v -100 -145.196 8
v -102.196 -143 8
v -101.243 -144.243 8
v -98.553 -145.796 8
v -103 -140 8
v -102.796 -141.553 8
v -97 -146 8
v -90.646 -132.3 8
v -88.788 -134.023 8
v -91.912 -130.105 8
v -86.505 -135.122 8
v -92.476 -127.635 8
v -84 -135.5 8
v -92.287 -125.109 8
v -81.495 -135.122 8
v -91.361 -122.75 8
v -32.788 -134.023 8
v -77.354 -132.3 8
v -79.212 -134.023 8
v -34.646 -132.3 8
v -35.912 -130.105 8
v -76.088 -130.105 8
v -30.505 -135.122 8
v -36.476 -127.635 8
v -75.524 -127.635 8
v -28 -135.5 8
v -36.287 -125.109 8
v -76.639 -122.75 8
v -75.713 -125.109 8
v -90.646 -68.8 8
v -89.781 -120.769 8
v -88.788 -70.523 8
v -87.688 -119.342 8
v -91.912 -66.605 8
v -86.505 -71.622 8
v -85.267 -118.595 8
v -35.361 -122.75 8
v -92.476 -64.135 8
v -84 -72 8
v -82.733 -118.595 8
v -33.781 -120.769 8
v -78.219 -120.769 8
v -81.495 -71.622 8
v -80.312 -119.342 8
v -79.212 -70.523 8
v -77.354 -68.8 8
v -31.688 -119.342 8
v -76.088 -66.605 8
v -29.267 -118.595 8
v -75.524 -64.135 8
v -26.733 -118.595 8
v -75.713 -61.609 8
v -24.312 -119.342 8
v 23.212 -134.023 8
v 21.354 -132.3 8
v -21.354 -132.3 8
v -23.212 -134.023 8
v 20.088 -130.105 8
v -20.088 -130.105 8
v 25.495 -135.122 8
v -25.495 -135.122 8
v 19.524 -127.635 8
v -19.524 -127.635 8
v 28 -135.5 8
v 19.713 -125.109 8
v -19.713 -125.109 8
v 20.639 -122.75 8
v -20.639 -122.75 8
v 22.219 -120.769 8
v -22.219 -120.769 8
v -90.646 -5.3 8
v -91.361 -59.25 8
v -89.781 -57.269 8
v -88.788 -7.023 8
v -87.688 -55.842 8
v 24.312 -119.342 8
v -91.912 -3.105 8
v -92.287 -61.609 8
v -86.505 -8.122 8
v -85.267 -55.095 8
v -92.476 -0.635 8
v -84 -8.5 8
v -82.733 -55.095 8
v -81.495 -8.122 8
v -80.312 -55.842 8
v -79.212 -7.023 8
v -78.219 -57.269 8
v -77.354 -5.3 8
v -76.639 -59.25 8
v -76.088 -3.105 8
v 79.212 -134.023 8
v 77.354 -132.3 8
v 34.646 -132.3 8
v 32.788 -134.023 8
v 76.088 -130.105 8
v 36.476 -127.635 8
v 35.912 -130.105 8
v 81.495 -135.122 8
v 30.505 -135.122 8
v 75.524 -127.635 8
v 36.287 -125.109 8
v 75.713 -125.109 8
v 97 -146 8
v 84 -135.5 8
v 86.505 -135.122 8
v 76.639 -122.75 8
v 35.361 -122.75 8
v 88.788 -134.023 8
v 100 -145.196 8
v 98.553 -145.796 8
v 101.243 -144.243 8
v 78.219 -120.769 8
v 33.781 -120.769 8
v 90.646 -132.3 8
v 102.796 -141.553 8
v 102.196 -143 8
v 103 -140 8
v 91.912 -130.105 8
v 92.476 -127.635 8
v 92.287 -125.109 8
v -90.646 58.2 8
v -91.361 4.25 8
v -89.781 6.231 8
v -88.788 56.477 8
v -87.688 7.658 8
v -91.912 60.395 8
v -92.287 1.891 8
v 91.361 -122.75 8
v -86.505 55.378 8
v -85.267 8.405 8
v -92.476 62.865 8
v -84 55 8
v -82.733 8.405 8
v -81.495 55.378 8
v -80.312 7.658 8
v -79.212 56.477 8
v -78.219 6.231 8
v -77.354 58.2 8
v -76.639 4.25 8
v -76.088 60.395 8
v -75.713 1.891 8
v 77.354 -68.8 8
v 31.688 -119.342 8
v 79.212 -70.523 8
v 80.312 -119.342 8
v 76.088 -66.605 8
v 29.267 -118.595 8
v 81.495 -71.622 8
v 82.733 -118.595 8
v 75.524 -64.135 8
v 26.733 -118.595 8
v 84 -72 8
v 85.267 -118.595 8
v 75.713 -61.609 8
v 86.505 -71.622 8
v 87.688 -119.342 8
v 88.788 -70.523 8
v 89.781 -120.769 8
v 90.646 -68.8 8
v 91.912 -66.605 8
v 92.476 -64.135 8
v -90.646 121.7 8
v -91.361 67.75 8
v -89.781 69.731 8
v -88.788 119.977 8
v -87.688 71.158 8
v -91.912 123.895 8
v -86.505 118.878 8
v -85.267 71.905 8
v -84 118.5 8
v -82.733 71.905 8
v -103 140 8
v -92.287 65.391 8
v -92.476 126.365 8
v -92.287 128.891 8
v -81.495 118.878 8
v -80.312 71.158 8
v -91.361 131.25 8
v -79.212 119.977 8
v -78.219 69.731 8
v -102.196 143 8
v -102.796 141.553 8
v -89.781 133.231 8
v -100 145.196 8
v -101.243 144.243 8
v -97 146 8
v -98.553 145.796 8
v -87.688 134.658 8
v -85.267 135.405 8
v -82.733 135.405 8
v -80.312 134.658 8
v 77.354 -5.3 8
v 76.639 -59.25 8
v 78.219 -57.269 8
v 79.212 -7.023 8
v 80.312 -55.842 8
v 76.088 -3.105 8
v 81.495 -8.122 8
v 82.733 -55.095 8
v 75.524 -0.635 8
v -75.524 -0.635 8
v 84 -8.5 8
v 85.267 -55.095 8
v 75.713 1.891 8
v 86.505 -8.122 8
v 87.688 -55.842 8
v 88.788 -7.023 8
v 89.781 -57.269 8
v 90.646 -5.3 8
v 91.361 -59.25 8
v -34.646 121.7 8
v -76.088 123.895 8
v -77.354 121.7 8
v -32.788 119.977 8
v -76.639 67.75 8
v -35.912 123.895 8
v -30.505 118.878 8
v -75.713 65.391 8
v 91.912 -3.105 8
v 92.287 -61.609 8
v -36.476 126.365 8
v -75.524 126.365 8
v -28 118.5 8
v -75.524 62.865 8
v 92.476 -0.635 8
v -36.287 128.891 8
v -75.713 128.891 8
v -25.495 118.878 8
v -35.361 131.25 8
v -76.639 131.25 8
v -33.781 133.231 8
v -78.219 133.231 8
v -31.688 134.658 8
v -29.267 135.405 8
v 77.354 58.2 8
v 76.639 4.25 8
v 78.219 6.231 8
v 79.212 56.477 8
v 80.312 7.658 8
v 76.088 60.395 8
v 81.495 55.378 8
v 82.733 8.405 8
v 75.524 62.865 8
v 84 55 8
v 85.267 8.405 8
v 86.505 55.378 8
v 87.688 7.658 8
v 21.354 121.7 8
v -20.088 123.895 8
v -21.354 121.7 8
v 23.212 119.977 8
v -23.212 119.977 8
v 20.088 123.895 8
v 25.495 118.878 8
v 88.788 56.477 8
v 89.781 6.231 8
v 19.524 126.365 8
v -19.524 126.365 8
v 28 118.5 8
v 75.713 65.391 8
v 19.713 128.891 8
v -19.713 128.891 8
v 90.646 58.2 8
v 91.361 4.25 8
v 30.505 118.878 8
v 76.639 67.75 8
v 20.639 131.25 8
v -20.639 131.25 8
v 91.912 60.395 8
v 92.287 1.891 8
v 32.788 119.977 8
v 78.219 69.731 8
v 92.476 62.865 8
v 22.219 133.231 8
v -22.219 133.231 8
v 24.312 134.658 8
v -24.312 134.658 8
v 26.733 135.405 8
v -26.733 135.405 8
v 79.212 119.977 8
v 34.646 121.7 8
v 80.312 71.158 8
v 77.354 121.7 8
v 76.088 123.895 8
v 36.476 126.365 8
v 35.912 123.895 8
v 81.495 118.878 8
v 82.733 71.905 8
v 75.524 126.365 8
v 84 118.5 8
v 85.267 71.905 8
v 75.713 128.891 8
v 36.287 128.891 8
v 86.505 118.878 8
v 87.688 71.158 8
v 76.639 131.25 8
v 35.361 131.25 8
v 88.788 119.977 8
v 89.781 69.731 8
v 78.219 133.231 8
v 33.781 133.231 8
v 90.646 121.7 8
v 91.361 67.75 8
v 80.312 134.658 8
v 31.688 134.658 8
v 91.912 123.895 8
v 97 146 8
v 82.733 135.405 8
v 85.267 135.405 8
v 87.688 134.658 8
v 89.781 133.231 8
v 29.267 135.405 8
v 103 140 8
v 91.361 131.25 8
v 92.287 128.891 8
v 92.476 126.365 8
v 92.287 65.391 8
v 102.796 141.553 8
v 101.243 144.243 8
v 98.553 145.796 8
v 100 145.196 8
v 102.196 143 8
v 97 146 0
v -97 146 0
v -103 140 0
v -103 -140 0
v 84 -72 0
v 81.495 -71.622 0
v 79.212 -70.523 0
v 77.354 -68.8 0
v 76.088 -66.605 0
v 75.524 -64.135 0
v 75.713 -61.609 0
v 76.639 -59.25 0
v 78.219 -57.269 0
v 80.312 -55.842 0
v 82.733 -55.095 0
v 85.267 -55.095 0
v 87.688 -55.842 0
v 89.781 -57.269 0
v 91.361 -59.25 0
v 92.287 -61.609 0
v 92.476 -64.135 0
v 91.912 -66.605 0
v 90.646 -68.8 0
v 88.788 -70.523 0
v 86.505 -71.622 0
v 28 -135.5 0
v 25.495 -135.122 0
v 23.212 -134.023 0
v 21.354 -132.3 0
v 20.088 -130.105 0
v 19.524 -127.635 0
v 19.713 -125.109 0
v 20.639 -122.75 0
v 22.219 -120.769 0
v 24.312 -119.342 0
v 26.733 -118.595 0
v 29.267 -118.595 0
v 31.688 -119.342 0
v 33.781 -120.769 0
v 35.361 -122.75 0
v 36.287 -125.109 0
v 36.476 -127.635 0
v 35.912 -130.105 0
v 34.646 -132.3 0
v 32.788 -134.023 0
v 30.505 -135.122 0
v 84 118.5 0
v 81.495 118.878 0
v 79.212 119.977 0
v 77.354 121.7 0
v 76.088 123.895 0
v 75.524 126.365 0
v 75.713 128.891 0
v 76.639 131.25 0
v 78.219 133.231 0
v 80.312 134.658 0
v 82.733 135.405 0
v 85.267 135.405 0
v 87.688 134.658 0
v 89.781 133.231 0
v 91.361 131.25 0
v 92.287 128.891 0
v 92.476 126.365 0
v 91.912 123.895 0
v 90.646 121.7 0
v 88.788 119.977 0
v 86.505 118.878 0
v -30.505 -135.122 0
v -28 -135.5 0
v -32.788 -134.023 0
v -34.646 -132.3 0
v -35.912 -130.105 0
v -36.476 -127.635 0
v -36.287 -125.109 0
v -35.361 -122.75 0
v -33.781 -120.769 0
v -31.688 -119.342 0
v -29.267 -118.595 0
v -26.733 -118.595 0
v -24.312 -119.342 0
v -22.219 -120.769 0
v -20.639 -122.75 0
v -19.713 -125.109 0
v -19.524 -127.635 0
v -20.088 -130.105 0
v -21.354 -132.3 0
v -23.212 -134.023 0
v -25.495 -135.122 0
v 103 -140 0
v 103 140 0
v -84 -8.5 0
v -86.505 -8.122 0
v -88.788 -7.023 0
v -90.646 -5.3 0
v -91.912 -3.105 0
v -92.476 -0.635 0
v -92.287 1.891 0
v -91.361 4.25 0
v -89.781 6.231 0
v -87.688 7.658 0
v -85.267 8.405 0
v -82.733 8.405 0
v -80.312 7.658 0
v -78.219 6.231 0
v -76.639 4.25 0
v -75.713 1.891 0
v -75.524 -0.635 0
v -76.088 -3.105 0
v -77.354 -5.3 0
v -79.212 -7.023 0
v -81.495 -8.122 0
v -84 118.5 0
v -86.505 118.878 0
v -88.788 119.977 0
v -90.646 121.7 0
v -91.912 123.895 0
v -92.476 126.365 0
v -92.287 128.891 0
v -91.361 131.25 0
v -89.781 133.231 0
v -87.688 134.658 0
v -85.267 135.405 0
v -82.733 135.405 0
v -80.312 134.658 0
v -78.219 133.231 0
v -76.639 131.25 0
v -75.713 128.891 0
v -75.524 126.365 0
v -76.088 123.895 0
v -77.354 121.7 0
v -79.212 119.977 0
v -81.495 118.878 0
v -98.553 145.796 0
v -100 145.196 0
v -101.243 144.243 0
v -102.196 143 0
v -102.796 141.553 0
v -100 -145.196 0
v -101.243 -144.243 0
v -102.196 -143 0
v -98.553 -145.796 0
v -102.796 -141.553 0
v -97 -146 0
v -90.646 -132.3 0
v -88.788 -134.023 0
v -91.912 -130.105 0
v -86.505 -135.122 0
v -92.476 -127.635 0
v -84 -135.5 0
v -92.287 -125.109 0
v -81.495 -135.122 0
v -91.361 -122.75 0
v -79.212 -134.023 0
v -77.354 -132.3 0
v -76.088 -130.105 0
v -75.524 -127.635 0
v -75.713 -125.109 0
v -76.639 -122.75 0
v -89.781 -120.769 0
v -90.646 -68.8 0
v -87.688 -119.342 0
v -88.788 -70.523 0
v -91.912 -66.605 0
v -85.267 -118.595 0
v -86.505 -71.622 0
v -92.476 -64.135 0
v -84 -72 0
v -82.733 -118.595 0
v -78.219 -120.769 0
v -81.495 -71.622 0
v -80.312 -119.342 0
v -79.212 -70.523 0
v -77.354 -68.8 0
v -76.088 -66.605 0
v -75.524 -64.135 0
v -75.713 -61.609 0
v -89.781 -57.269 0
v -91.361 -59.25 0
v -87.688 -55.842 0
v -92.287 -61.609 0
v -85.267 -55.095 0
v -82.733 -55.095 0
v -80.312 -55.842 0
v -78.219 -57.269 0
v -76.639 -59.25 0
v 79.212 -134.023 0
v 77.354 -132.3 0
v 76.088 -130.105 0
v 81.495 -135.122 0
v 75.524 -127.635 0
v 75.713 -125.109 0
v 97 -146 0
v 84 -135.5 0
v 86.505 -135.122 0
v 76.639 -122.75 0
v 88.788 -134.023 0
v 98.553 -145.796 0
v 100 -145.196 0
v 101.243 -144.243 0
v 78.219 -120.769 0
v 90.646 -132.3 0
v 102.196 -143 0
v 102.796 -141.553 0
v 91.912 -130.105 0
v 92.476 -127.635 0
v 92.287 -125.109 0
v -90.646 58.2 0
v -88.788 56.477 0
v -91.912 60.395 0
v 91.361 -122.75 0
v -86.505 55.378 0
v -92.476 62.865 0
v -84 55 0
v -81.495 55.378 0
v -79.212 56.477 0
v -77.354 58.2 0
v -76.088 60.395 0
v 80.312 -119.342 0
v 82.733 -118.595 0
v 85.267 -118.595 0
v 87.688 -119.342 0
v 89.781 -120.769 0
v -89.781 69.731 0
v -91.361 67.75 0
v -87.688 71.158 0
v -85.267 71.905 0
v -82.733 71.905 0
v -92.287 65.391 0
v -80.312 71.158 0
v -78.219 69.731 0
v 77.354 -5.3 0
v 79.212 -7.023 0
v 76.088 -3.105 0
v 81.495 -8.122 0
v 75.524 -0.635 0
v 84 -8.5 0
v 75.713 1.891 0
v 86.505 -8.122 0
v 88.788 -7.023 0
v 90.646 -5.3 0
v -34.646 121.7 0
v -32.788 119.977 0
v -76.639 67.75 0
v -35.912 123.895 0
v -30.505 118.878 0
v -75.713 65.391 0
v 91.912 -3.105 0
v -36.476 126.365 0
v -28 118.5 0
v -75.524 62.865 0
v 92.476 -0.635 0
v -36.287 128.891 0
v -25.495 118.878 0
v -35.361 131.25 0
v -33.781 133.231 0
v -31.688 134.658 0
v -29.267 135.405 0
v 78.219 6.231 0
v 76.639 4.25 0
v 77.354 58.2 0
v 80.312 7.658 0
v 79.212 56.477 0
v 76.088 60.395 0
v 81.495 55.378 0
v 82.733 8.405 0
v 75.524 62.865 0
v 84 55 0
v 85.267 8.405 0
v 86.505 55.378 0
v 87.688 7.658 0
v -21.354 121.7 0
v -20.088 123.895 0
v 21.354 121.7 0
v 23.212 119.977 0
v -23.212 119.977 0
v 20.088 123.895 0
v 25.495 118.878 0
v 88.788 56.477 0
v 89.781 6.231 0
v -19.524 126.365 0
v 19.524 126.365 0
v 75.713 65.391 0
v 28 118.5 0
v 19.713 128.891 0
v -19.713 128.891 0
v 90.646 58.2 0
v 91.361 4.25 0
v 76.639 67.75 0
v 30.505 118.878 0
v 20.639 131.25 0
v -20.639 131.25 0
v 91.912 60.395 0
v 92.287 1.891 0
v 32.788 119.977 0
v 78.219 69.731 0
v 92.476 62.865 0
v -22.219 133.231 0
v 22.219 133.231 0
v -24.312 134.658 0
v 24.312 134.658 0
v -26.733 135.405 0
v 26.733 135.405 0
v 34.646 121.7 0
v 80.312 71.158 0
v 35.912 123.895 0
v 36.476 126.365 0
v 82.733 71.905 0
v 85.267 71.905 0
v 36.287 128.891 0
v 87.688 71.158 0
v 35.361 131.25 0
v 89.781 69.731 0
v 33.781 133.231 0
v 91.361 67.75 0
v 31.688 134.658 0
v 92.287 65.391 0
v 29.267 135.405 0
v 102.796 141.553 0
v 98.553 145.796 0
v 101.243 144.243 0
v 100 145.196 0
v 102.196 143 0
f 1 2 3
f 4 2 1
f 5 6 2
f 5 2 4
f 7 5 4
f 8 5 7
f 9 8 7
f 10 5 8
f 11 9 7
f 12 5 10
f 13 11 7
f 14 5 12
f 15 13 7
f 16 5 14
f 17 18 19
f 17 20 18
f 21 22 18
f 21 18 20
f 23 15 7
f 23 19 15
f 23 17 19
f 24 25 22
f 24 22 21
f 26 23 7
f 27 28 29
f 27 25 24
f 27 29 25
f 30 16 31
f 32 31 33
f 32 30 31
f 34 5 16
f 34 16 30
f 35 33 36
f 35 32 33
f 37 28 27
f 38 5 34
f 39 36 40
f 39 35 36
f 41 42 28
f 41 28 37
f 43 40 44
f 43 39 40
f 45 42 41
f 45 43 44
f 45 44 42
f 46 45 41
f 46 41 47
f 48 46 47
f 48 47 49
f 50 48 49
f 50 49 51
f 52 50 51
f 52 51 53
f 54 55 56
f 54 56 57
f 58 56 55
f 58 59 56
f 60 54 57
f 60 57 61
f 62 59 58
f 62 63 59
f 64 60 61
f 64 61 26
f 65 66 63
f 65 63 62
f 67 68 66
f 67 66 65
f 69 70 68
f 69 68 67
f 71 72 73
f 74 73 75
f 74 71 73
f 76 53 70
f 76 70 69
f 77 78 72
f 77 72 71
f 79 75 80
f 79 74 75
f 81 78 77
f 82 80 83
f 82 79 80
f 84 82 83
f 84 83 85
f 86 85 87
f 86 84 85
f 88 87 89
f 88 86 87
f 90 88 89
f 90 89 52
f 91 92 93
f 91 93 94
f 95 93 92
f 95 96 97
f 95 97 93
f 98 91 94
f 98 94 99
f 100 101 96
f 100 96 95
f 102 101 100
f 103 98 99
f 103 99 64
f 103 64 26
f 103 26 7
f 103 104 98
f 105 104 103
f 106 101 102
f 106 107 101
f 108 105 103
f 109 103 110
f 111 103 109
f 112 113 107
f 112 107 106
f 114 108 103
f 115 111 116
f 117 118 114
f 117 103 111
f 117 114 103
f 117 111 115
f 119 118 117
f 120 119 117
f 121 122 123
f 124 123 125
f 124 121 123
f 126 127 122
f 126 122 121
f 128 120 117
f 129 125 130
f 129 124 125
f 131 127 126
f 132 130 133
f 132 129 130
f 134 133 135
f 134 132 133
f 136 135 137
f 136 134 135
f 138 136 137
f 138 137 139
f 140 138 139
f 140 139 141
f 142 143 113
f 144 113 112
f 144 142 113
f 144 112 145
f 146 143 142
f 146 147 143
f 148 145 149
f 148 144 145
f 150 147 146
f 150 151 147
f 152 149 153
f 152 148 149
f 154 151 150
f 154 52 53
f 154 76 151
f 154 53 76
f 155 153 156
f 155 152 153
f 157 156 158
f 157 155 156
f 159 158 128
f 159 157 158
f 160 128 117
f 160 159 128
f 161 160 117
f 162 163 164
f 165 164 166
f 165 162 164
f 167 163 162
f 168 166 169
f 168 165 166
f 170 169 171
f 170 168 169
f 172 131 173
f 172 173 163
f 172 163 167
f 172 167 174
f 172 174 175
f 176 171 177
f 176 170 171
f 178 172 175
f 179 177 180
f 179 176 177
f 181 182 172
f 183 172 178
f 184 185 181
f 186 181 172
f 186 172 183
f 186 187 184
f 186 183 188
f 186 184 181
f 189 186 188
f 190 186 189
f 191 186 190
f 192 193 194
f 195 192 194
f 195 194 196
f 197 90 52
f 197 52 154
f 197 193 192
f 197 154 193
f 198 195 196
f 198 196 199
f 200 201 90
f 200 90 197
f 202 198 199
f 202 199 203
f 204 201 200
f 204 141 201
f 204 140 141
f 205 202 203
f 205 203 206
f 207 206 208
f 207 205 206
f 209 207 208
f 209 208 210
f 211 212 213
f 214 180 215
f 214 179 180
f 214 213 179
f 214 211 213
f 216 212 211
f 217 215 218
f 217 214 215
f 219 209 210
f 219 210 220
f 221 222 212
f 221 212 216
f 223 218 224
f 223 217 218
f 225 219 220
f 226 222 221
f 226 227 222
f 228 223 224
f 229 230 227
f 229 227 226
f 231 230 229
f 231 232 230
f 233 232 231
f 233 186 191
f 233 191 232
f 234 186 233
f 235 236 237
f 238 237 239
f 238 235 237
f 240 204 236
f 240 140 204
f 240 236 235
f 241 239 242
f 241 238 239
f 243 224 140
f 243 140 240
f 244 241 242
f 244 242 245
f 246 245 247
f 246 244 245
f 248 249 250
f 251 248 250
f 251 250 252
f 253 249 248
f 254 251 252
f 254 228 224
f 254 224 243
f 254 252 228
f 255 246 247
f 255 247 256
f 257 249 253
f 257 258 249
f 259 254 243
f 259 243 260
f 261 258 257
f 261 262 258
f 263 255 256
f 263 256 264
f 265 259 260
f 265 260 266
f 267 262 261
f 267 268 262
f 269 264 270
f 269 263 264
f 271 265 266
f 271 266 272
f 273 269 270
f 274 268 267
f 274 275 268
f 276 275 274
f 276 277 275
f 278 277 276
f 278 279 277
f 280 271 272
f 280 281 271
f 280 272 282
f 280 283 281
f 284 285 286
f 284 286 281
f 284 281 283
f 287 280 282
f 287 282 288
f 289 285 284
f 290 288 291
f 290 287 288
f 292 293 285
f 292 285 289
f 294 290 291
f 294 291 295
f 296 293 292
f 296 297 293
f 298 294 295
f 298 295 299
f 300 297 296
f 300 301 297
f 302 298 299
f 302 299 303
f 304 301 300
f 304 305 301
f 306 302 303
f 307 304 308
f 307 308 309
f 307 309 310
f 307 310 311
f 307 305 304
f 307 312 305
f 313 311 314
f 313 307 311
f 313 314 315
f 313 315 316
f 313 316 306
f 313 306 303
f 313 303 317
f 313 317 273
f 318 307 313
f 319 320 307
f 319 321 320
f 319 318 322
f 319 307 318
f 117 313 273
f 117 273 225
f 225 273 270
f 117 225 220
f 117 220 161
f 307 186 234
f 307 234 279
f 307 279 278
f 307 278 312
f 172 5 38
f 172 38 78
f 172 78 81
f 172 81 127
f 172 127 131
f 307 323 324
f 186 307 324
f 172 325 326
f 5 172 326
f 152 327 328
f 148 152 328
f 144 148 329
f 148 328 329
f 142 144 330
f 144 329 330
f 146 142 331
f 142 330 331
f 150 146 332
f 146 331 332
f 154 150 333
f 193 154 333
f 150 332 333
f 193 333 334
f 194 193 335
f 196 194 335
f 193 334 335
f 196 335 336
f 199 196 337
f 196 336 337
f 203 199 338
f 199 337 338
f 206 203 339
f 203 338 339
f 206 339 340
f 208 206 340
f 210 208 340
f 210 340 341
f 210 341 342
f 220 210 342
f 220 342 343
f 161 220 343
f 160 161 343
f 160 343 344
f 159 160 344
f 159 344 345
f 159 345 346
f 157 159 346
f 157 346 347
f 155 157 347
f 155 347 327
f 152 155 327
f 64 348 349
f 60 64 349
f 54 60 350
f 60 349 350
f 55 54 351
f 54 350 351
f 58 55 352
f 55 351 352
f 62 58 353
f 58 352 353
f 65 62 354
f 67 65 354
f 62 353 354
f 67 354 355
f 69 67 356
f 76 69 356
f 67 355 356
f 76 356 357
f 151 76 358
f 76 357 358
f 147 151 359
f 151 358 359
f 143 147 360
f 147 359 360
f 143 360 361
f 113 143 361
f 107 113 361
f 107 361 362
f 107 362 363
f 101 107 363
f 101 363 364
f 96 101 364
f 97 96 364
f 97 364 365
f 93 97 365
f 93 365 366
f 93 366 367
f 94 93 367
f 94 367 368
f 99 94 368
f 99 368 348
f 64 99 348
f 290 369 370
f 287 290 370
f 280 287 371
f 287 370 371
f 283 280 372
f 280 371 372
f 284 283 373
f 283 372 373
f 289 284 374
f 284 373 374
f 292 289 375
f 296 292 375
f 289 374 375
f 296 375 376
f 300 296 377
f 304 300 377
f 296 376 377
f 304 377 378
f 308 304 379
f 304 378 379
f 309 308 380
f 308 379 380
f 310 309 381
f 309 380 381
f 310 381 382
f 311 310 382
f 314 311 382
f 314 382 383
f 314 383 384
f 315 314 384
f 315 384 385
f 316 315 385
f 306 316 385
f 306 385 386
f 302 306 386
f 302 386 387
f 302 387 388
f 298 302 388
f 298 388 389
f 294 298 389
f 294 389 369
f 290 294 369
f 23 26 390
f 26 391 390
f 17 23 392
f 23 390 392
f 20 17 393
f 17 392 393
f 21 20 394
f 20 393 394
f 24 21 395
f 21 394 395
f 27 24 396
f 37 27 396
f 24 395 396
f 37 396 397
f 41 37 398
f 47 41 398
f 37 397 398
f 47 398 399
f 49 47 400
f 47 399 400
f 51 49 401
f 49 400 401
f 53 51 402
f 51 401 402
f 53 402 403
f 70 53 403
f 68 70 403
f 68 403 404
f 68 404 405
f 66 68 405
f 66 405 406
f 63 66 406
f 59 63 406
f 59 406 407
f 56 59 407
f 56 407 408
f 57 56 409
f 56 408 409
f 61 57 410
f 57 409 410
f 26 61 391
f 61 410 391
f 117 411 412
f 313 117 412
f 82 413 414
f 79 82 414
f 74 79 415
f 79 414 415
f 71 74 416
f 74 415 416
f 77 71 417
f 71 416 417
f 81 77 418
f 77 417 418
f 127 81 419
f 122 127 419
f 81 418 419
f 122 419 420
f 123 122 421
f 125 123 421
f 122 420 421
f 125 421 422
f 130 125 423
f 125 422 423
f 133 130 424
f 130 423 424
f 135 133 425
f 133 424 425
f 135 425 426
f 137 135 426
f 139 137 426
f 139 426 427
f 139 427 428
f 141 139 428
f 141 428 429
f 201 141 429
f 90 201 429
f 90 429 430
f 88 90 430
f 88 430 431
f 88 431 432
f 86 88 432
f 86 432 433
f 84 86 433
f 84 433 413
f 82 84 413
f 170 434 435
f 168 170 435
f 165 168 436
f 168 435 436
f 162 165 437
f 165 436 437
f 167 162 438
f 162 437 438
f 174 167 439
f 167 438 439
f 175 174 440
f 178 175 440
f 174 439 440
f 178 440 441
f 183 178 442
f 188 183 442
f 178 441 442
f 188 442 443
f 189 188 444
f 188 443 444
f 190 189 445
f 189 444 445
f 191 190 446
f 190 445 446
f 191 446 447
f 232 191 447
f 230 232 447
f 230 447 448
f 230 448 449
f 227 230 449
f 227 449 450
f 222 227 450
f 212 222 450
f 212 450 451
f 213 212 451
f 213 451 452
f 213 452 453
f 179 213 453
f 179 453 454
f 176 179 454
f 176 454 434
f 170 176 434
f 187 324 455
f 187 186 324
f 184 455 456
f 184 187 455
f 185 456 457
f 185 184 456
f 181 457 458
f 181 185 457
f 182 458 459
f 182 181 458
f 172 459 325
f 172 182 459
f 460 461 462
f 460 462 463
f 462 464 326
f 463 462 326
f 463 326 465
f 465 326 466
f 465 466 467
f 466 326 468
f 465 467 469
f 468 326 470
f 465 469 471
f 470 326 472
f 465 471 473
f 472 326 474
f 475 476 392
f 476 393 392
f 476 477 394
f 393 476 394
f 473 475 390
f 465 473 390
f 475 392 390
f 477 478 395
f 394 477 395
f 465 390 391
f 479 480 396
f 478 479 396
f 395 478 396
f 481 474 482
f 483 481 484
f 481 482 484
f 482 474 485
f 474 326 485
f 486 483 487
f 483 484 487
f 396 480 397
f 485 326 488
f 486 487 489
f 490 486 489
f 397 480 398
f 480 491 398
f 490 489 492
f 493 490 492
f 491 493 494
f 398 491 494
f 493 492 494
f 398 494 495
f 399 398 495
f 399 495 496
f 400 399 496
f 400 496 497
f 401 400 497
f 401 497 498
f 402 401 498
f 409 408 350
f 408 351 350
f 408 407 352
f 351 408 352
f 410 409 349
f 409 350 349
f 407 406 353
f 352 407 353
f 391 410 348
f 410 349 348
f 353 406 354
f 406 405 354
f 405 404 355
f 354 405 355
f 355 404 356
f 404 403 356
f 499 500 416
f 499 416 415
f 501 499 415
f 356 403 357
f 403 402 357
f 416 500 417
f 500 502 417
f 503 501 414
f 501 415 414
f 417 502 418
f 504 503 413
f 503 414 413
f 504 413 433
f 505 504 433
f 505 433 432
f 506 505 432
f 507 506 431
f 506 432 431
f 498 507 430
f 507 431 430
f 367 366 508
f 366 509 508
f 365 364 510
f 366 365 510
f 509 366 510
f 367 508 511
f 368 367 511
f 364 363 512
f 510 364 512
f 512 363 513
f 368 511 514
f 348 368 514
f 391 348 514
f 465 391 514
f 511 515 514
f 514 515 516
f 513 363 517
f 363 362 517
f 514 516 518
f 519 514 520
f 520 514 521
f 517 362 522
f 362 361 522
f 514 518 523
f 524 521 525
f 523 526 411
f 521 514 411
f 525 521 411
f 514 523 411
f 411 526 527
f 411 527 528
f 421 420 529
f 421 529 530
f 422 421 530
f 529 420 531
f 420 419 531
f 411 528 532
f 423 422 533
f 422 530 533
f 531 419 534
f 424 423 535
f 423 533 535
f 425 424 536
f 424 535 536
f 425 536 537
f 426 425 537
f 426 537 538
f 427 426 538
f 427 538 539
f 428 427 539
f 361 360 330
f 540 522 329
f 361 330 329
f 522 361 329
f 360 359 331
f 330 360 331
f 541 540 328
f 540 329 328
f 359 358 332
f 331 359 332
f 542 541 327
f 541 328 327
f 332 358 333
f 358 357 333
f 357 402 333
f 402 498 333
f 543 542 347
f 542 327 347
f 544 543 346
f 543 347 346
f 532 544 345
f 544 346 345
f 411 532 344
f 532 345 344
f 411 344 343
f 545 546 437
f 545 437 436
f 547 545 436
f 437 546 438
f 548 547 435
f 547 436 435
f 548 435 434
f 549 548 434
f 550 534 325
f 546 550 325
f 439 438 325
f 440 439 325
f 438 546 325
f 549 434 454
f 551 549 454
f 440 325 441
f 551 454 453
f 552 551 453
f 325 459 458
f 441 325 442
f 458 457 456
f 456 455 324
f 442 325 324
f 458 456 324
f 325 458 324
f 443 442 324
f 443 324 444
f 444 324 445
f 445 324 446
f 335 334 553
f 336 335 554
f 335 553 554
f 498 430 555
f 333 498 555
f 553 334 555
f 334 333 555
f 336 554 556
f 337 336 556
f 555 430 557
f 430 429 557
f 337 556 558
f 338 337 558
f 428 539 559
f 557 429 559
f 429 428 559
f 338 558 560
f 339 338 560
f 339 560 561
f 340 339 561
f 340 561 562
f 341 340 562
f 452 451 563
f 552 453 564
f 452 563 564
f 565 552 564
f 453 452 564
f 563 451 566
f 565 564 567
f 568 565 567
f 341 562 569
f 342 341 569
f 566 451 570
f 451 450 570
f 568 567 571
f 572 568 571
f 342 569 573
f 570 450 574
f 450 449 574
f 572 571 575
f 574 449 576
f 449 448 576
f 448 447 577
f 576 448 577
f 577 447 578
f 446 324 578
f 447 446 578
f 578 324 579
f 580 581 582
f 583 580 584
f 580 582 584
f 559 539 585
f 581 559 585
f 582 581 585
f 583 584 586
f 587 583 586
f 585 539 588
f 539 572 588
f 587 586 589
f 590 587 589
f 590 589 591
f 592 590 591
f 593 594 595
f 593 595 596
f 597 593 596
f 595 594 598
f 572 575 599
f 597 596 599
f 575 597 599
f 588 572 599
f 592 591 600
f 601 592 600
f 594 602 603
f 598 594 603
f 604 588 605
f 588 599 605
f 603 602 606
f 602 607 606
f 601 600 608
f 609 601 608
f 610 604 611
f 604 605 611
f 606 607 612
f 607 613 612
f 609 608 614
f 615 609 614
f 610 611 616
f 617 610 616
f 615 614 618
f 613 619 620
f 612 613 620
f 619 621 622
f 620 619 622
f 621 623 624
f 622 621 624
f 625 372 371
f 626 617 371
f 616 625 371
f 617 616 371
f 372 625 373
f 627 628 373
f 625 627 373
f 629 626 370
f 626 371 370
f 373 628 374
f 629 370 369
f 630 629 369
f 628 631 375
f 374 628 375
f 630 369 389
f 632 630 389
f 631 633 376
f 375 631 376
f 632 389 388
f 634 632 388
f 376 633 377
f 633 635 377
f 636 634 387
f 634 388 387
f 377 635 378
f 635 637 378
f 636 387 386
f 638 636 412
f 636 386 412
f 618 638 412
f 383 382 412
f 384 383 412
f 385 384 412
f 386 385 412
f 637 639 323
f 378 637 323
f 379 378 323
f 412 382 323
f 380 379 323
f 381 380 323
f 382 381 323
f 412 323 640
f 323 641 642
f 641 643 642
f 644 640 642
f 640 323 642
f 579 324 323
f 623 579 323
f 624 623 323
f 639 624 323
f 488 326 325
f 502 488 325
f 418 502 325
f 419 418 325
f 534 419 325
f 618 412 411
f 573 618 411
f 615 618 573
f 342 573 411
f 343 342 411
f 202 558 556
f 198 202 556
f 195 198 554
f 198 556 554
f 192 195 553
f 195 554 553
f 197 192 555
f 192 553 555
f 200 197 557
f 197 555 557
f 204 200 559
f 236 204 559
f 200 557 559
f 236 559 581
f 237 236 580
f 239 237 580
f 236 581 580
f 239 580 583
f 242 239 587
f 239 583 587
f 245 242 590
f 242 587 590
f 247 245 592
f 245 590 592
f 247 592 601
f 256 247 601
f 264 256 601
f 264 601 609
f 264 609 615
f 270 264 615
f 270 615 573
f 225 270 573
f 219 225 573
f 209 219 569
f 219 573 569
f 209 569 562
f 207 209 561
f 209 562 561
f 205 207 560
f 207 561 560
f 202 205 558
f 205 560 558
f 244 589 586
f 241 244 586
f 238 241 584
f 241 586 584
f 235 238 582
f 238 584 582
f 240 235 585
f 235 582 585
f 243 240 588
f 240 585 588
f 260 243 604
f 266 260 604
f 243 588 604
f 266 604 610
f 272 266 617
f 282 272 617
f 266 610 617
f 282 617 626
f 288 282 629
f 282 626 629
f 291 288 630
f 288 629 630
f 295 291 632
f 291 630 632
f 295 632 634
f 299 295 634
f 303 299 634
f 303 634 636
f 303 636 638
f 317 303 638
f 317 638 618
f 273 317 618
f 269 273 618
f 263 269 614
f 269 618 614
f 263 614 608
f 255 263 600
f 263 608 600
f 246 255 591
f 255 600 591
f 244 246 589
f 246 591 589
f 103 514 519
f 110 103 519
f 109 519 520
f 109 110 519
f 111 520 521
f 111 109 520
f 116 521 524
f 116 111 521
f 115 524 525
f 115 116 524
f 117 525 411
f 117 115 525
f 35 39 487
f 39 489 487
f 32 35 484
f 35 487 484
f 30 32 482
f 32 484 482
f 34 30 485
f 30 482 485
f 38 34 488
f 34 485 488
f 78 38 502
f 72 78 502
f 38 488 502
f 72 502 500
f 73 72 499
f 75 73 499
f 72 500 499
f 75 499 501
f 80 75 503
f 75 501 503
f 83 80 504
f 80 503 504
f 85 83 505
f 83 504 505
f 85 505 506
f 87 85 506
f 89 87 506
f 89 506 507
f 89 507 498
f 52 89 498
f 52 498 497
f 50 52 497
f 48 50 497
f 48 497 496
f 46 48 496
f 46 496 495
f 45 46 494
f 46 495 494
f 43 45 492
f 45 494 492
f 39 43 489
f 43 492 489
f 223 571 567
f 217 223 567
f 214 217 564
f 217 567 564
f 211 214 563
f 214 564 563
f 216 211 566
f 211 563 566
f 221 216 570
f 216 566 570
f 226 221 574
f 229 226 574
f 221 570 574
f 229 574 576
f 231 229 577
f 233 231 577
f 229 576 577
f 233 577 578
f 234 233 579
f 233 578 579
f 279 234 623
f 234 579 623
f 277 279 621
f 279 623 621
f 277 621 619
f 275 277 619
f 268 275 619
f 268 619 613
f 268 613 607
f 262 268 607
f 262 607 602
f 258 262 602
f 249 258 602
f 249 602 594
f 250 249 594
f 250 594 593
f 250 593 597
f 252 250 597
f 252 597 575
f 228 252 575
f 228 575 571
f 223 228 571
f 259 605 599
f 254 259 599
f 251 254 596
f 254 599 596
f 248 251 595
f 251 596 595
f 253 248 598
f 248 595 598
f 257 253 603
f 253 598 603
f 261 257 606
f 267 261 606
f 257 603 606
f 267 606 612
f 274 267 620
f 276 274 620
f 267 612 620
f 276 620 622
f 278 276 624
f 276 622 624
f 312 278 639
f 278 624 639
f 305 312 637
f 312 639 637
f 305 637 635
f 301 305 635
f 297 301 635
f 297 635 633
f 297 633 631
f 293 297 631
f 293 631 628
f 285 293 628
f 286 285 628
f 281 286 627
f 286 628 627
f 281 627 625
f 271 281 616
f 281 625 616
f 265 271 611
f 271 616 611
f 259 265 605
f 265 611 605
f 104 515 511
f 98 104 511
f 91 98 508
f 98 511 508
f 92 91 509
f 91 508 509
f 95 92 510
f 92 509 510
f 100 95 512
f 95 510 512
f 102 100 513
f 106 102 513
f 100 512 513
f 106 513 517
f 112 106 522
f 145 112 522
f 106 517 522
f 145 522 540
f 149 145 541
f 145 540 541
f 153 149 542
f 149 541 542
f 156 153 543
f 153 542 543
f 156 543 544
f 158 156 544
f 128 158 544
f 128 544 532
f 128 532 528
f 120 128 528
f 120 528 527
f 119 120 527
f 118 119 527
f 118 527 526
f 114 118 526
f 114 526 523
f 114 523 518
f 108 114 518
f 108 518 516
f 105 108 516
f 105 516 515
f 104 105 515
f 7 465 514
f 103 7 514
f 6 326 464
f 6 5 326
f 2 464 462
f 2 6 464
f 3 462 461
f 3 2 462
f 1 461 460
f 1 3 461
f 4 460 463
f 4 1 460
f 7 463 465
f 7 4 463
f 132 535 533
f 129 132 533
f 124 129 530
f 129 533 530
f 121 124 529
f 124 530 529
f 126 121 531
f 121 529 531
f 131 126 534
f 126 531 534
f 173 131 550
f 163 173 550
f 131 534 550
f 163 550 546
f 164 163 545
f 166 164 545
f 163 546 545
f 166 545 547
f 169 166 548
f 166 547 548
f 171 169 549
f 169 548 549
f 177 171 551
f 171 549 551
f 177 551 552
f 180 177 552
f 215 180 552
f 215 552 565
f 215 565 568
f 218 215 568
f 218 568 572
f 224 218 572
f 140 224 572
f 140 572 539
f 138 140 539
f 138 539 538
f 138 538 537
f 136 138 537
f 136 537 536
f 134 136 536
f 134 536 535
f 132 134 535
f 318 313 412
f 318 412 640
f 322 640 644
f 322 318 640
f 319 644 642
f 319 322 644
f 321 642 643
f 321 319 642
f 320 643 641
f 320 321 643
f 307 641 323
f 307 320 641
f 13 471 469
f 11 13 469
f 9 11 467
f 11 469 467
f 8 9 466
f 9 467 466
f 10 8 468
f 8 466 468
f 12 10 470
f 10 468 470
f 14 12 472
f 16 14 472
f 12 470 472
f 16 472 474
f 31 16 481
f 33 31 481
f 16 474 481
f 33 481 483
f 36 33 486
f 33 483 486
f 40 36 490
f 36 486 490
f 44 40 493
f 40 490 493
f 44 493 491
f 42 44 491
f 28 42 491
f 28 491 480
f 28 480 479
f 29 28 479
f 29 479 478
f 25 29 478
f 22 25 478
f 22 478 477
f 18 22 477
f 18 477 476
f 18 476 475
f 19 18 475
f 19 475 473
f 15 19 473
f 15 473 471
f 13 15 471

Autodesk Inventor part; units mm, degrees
ref_plane "YZ Plane" through (0, 0, 0) normal (1, 0, 0) x (0, 1, 0)
ref_plane "XZ Plane" through (0, 0, 0) normal (0, 1, 0) x (-1, 0, 0)
ref_plane "XY Plane" through (0, 0, 0) normal (0, 0, 1) x (1, 0, 0)
sketch "Sketch2" plane through (0, 0, 0) normal (0, 0, 1) x (1, 0, 0)
  line L0 (-53, -96) -> (53, -96)
  line L1 (53, -96) -> (53, 96)
  line L2 (53, 96) -> (-53, 96)
  line L3 (-53, 96) -> (-53, -96)
  line L4 (-53, -96) -> (53, 96) construction
  line L5 (53, -96) -> (-53, 96) construction
  line L6 (-103, -146) -> (103, -146)
  line L7 (103, -146) -> (103, 146)
  line L8 (103, 146) -> (-103, 146)
  line L9 (-103, 146) -> (-103, -146)
  point P0 (0, 0)
  dimension "d31" = 50
  dimension "d60" = 192
  dimension "d61" = 106
extrude "Plate2" add sketch "Sketch2" along normal blind 8 contours L3 L2 L1 L0 | L9 L8 L7 L6
sketch "Sketch5" plane through (0, 0, 8) normal (0, 0, 1) x (1, 0, 0)
  line L0 (103, -146) -> (-103, -146) construction
  line L1 (103, 146) -> (103, -146) construction
  line L2 (-103, 146) -> (103, 146) construction
  line L3 (-103, -146) -> (-103, 146) construction
  line L4 (-84, 127) -> (84, 127) construction
  line L5 (84, 127) -> (84, -127) construction
  line L6 (84, -127) -> (-84, -127) construction
  line L7 (-84, -127) -> (-84, 127) construction
  line L8 (-28, -127) -> (28, -127)
  line L9 (28, -127) -> (28, 127) construction
  line L10 (28, 127) -> (-28, 127)
  line L11 (-28, 127) -> (-28, -127) construction
  line L12 (-28, 0) -> (28, 0) construction
  point P0 (0, 0)
  point P1 (0, -127)
  point P2 (-84, -63.5)
  point P3 (-84, 0)
  point P4 (-84, 63.5)
  point P5 (84, 63.5)
  point P6 (84, 0)
  point P7 (84, -63.5)
  point P8 (0, 0)
  dimension "d34" = 19
  dimension "d47" = 63.5
  dimension "d48" = 63.5
  dimension "d49" = 56
  dimension "d50" = 56
fillet "Corner Round1" radius 6 4 edges at (-103, -146, 4) (-103, 146, 4) (103, 146, 4) (103, -146, 4)
hole "Hole1" at (-84, -127, 8) at (-84, -63.5, 8) at (-84, 0, 8) at (-84, 63.5, 8) at (-84, 127, 8) at (84, 127, 8) at (84, 63.5, 8) at (84, 0, 8) at (84, -63.5, 8) at (84, -127, 8) at (-28, -127, 8) at (28, 127, 8) at (28, -127, 8) at (-28, 127, 8) direction (0, 0, -1) diameter 17 end through all
equation "\"d47\" = d48"
equation "\"d49\" = d50"
equation "\"d60\" = ChargingHatch_width - 2 * Thickness"
equation "\"d61\" = ChargingHatch_hight - 2 * Thickness"
equation "\"d56\" = Thickness"
equation "\"d14\" = Thickness"
equation "\"BendReliefWidth\" = Thickness"
equation "\"BendReliefDepth\" = 0.5 * Thickness"
equation "\"CornerReliefSize\" = 4 * Thickness"
equation "\"MinimumRemnant\" = 2 * Thickness"
equation "\"TransitionRadius\" = BendRadius"
equation "\"JacobiRadiusSize\" = BendRadius"
equation "\"GapSize\" = Thickness"
equation "\"ChargingHatch_width\" = 208"
equation "\"Thickness\" = 8"
equation "\"ChargingHatch_hight\" = 122"
equation "\"BendRadius\" = 6"
properties part number "PRS 9607 charging flange rect_D1200 940" material "Steel"
